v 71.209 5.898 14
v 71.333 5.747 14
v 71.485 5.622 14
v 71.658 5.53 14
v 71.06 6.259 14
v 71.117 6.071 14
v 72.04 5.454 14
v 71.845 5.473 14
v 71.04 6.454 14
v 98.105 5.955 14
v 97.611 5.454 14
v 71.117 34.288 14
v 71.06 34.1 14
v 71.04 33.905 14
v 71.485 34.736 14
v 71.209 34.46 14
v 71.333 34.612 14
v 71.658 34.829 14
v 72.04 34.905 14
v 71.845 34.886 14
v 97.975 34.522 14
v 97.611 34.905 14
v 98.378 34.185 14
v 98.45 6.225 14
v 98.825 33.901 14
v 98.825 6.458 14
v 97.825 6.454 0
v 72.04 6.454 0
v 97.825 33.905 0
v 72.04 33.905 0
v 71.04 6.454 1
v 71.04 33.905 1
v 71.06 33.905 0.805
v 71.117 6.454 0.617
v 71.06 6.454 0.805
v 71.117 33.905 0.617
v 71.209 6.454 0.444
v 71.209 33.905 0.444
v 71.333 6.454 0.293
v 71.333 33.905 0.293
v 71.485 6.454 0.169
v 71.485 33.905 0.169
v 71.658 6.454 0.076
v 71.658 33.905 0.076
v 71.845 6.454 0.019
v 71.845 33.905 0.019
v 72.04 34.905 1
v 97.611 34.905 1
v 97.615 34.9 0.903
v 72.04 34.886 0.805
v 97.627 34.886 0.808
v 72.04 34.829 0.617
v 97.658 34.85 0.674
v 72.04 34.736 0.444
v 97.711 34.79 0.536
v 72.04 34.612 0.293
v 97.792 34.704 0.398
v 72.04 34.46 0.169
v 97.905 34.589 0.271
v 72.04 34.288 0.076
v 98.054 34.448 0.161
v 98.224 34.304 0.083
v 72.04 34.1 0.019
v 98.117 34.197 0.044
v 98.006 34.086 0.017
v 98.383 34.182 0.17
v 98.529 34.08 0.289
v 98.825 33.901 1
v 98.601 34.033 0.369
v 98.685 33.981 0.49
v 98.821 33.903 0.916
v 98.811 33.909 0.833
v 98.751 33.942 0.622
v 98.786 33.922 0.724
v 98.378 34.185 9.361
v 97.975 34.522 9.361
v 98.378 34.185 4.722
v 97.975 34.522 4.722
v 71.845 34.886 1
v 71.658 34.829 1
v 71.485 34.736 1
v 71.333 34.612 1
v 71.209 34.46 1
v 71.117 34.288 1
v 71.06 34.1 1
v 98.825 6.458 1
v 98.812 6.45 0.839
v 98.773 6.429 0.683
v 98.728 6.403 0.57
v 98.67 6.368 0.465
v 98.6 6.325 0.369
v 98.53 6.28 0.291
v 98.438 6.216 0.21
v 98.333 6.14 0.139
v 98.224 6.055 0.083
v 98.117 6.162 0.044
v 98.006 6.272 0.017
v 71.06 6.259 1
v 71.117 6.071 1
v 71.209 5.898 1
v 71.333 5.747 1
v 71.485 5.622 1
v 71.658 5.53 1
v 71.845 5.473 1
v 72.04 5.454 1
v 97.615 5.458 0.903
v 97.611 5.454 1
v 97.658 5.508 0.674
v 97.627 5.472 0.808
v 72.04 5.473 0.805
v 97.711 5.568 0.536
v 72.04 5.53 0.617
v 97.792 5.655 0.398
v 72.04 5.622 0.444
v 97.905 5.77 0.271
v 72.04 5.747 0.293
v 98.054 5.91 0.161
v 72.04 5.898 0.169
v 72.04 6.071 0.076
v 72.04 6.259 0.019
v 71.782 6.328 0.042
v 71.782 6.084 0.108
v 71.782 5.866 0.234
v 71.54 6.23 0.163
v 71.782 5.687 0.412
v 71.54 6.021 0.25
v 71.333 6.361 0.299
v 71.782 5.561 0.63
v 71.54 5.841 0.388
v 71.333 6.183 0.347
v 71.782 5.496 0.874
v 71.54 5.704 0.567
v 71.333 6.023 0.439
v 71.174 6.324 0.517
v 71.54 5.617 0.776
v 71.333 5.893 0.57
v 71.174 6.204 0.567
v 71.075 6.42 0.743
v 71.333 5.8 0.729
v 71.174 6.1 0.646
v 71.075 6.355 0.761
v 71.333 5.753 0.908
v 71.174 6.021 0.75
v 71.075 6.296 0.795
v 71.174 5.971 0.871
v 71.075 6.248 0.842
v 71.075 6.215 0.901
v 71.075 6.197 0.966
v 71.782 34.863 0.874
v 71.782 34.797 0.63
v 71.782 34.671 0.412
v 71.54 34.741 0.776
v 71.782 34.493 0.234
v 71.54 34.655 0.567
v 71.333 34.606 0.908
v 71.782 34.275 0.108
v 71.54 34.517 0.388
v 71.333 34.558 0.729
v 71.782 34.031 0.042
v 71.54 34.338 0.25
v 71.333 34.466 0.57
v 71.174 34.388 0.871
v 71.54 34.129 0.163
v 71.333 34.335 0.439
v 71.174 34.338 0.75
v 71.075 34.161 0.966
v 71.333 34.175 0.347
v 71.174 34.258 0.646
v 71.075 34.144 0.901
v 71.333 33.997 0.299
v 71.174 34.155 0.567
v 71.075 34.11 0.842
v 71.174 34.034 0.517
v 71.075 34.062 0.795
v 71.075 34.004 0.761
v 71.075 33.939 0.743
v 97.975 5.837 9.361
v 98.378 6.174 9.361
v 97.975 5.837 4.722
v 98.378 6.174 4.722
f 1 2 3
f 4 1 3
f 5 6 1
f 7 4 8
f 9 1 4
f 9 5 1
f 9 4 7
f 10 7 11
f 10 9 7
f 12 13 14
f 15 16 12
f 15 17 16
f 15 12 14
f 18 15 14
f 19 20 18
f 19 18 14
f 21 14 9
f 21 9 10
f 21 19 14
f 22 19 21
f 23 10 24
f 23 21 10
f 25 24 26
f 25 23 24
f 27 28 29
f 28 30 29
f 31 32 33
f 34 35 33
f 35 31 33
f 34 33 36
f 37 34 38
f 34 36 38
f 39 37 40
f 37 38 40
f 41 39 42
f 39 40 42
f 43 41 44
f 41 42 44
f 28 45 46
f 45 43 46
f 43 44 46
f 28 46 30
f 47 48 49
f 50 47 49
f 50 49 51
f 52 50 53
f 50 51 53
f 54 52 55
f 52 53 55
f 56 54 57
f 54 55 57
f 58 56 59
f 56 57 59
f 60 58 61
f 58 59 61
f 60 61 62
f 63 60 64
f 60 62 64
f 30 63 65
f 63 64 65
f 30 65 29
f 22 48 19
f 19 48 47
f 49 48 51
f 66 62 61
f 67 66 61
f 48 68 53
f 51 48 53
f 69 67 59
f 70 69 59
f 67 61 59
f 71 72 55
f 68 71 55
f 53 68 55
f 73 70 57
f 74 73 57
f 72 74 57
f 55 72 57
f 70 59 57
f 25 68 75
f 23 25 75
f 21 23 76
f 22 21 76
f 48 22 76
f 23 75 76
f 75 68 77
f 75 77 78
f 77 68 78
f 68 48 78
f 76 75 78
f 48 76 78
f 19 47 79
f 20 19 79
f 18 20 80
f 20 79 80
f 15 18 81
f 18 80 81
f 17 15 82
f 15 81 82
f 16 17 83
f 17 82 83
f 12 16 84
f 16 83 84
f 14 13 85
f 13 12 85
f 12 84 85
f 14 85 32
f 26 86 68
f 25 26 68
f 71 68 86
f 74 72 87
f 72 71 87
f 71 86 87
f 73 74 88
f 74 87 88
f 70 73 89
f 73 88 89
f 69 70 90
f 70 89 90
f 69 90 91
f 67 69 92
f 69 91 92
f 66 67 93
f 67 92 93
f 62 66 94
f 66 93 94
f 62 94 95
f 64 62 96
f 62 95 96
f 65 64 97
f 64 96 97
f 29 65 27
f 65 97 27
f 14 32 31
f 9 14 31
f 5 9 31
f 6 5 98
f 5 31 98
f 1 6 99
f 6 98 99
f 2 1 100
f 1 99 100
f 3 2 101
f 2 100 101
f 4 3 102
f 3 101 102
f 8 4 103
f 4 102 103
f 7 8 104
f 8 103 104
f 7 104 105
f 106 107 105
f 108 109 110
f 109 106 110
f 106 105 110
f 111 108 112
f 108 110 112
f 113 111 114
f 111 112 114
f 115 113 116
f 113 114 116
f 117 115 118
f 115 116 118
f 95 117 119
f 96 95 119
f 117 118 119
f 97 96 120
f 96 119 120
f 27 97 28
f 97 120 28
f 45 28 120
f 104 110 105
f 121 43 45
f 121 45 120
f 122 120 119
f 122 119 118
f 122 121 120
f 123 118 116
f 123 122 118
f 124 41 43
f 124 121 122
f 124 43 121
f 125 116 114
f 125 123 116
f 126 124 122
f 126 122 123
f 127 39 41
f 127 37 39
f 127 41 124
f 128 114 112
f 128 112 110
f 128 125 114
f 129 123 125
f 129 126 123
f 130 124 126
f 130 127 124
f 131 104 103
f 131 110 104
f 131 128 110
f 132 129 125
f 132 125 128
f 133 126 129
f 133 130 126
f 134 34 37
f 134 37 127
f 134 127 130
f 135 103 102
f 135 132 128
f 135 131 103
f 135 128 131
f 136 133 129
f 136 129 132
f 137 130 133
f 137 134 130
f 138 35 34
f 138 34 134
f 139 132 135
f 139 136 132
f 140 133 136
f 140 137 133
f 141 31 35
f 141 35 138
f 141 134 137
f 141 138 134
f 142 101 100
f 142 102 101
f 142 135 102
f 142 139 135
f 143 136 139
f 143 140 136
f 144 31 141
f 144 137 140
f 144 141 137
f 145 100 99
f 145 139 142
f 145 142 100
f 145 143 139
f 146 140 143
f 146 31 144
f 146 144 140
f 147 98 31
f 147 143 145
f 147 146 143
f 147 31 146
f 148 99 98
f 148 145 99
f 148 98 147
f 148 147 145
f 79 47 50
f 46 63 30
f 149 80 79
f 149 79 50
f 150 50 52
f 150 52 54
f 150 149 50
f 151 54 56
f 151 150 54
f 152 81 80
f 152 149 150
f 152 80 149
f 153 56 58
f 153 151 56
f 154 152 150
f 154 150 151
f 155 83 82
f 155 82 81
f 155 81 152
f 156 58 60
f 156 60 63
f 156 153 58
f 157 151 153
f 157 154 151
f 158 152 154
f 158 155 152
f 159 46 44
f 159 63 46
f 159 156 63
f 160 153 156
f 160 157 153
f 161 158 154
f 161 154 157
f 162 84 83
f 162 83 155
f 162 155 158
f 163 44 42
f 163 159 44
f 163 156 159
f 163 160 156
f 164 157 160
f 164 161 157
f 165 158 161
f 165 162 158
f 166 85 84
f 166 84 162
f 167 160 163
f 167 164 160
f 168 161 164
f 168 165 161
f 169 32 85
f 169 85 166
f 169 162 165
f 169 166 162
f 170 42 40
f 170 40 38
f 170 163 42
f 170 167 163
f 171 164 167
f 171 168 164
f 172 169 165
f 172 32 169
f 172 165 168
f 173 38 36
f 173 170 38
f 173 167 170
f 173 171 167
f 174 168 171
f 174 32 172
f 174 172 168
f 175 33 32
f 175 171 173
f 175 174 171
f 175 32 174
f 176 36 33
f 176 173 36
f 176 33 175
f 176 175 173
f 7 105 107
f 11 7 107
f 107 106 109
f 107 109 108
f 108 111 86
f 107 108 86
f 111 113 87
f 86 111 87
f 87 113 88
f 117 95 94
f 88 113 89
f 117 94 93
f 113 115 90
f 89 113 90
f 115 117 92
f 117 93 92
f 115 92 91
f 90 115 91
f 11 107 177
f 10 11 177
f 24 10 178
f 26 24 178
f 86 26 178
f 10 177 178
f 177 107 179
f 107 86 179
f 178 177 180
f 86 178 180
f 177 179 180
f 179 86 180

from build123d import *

# Parameters (mm, degrees)
BOSS_EXTRUDE1_DEPTH = 14
FILLET1_R           = 1
FILLET2_R           = 1


with BuildPart() as part:
    # Sketch1 → Boss-Extrude1 (new body)
    with BuildSketch(Plane.XY):
        with BuildLine():
            Line((71.040481499, 34.904877363), (71.040481499, 5.453644912))
            Line((71.040481499, 5.453644912), (97.610515081, 5.453644912))
            add(Edge.make_bspline(
                [(97.610515081, 5.453644912), (97.957362424, 5.858397077), (98.354905943, 6.201823205), (98.824935041, 6.457565141)],
                knots=[0, 0, 0, 0, 1, 1, 1, 1], degree=3))
            Line((98.824935041, 6.457565141), (98.824935041, 33.900957115))
            add(Edge.make_bspline(
                [(98.824935041, 33.900957115), (98.354905942, 34.156699053), (97.957362434, 34.5001252), (97.610515091, 34.904877363)],
                knots=[0, 0, 0, 0, 1, 1, 1, 1], degree=3))
            Line((97.610515091, 34.904877363), (71.040481499, 34.904877363))
        make_face()
    extrude(amount=BOSS_EXTRUDE1_DEPTH)

    # Fillet1
    # the kernel refuses this fillet: 1 mm, written as the material it takes off along each edge
    with BuildSketch(Plane(origin=(98.824935041, 3.957565141, 0), x_dir=(0, 0, 1), z_dir=(0, 1, 0))) as fillet1_piece_1:
        with BuildLine():
            CenterArc((FILLET1_R, -FILLET1_R), FILLET1_R, 90, 90)
            Line((0, -FILLET1_R), (0, 0))
            Line((0, 0), (FILLET1_R, 0))
        make_face()
    extrude(amount=32.443391974, mode=Mode.SUBTRACT)
    with BuildSketch(Plane(origin=(68.540481499, 5.453644912, 0), x_dir=(0, 0, 1), z_dir=(1, 0, 0))) as fillet1_piece_2:
        with BuildLine():
            CenterArc((FILLET1_R, -FILLET1_R), FILLET1_R, 90, 90)
            Line((0, -FILLET1_R), (0, 0))
            Line((0, 0), (FILLET1_R, 0))
        make_face()
    extrude(amount=31.570033582, mode=Mode.SUBTRACT)
    with BuildSketch(Plane(origin=(71.040481499, 37.404877363, 0), x_dir=(0, 0, 1), z_dir=(0, -1, 0))) as fillet1_piece_3:
        with BuildLine():
            CenterArc((FILLET1_R, -FILLET1_R), FILLET1_R, 90, 90)
            Line((0, -FILLET1_R), (0, 0))
            Line((0, 0), (FILLET1_R, 0))
        make_face()
    extrude(amount=34.45123245, mode=Mode.SUBTRACT)
    with BuildSketch(Plane(origin=(100.110515091, 34.904877363, 0), x_dir=(0, 0, 1), z_dir=(-1, 0, 0))) as fillet1_piece_4:
        with BuildLine():
            CenterArc((FILLET1_R, -FILLET1_R), FILLET1_R, 90, 90)
            Line((0, -FILLET1_R), (0, 0))
            Line((0, 0), (FILLET1_R, 0))
        make_face()
    extrude(amount=31.570033592, mode=Mode.SUBTRACT)

    # Fillet2
    # the kernel refuses this fillet: 1 mm, written as the material it takes off along each edge
    with BuildSketch(Plane(origin=(72.040481499, 33.904877363, 1), x_dir=(0, 1, 0), z_dir=(-1, 0, 0))) as fillet2_piece_1_section:
        Polygon((0, 0), (FILLET2_R, 0), (FILLET2_R, FILLET2_R), (0, FILLET2_R), align=None)
    fillet2_piece_1 = extrude(amount=FILLET2_R, mode=Mode.PRIVATE)
    fillet2_piece_1 = fillet2_piece_1 - Plane(origin=(72.040481499, 33.904877363, 1), x_dir=(0, -0.7071067811865475, 0.7071067811865475), z_dir=(-1, 0, 0)) * Sphere(FILLET2_R, mode=Mode.PRIVATE)
    add(fillet2_piece_1, mode=Mode.SUBTRACT)
    with BuildSketch(Plane(origin=(72.040481499, 6.453644912, 1), x_dir=(0, -1, 0), z_dir=(-1, 0, 0))) as fillet2_piece_2_section:
        Polygon((0, 0), (FILLET2_R, 0), (FILLET2_R, -FILLET2_R), (0, -FILLET2_R), align=None)
    fillet2_piece_2 = extrude(amount=FILLET2_R, mode=Mode.PRIVATE)
    fillet2_piece_2 = fillet2_piece_2 - Plane(origin=(72.040481499, 6.453644912, 1), x_dir=(0, 0.7071067811865475, 0.7071067811865475), z_dir=(-1, 0, 0)) * Sphere(FILLET2_R, mode=Mode.PRIVATE)
    add(fillet2_piece_2, mode=Mode.SUBTRACT)
    with BuildSketch(Plane(origin=(71.040481499, 34.904877363, 1), x_dir=(0, -1, 0), z_dir=(0, 0, 1))) as fillet2_piece_3:
        with BuildLine():
            CenterArc((FILLET2_R, FILLET2_R), FILLET2_R, 180, 90)
            Line((0, FILLET2_R), (0, 0))
            Line((0, 0), (FILLET2_R, 0))
        make_face()
    extrude(amount=15.5, mode=Mode.SUBTRACT)
    with BuildSketch(Plane(origin=(71.040481499, 5.453644912, 1), x_dir=(0, 1, 0), z_dir=(0, 0, 1))) as fillet2_piece_4:
        with BuildLine():
            CenterArc((FILLET2_R, -FILLET2_R), FILLET2_R, 90, 90)
            Line((0, -FILLET2_R), (0, 0))
            Line((0, 0), (FILLET2_R, 0))
        make_face()
    extrude(amount=15.5, mode=Mode.SUBTRACT)


solid = part.part
